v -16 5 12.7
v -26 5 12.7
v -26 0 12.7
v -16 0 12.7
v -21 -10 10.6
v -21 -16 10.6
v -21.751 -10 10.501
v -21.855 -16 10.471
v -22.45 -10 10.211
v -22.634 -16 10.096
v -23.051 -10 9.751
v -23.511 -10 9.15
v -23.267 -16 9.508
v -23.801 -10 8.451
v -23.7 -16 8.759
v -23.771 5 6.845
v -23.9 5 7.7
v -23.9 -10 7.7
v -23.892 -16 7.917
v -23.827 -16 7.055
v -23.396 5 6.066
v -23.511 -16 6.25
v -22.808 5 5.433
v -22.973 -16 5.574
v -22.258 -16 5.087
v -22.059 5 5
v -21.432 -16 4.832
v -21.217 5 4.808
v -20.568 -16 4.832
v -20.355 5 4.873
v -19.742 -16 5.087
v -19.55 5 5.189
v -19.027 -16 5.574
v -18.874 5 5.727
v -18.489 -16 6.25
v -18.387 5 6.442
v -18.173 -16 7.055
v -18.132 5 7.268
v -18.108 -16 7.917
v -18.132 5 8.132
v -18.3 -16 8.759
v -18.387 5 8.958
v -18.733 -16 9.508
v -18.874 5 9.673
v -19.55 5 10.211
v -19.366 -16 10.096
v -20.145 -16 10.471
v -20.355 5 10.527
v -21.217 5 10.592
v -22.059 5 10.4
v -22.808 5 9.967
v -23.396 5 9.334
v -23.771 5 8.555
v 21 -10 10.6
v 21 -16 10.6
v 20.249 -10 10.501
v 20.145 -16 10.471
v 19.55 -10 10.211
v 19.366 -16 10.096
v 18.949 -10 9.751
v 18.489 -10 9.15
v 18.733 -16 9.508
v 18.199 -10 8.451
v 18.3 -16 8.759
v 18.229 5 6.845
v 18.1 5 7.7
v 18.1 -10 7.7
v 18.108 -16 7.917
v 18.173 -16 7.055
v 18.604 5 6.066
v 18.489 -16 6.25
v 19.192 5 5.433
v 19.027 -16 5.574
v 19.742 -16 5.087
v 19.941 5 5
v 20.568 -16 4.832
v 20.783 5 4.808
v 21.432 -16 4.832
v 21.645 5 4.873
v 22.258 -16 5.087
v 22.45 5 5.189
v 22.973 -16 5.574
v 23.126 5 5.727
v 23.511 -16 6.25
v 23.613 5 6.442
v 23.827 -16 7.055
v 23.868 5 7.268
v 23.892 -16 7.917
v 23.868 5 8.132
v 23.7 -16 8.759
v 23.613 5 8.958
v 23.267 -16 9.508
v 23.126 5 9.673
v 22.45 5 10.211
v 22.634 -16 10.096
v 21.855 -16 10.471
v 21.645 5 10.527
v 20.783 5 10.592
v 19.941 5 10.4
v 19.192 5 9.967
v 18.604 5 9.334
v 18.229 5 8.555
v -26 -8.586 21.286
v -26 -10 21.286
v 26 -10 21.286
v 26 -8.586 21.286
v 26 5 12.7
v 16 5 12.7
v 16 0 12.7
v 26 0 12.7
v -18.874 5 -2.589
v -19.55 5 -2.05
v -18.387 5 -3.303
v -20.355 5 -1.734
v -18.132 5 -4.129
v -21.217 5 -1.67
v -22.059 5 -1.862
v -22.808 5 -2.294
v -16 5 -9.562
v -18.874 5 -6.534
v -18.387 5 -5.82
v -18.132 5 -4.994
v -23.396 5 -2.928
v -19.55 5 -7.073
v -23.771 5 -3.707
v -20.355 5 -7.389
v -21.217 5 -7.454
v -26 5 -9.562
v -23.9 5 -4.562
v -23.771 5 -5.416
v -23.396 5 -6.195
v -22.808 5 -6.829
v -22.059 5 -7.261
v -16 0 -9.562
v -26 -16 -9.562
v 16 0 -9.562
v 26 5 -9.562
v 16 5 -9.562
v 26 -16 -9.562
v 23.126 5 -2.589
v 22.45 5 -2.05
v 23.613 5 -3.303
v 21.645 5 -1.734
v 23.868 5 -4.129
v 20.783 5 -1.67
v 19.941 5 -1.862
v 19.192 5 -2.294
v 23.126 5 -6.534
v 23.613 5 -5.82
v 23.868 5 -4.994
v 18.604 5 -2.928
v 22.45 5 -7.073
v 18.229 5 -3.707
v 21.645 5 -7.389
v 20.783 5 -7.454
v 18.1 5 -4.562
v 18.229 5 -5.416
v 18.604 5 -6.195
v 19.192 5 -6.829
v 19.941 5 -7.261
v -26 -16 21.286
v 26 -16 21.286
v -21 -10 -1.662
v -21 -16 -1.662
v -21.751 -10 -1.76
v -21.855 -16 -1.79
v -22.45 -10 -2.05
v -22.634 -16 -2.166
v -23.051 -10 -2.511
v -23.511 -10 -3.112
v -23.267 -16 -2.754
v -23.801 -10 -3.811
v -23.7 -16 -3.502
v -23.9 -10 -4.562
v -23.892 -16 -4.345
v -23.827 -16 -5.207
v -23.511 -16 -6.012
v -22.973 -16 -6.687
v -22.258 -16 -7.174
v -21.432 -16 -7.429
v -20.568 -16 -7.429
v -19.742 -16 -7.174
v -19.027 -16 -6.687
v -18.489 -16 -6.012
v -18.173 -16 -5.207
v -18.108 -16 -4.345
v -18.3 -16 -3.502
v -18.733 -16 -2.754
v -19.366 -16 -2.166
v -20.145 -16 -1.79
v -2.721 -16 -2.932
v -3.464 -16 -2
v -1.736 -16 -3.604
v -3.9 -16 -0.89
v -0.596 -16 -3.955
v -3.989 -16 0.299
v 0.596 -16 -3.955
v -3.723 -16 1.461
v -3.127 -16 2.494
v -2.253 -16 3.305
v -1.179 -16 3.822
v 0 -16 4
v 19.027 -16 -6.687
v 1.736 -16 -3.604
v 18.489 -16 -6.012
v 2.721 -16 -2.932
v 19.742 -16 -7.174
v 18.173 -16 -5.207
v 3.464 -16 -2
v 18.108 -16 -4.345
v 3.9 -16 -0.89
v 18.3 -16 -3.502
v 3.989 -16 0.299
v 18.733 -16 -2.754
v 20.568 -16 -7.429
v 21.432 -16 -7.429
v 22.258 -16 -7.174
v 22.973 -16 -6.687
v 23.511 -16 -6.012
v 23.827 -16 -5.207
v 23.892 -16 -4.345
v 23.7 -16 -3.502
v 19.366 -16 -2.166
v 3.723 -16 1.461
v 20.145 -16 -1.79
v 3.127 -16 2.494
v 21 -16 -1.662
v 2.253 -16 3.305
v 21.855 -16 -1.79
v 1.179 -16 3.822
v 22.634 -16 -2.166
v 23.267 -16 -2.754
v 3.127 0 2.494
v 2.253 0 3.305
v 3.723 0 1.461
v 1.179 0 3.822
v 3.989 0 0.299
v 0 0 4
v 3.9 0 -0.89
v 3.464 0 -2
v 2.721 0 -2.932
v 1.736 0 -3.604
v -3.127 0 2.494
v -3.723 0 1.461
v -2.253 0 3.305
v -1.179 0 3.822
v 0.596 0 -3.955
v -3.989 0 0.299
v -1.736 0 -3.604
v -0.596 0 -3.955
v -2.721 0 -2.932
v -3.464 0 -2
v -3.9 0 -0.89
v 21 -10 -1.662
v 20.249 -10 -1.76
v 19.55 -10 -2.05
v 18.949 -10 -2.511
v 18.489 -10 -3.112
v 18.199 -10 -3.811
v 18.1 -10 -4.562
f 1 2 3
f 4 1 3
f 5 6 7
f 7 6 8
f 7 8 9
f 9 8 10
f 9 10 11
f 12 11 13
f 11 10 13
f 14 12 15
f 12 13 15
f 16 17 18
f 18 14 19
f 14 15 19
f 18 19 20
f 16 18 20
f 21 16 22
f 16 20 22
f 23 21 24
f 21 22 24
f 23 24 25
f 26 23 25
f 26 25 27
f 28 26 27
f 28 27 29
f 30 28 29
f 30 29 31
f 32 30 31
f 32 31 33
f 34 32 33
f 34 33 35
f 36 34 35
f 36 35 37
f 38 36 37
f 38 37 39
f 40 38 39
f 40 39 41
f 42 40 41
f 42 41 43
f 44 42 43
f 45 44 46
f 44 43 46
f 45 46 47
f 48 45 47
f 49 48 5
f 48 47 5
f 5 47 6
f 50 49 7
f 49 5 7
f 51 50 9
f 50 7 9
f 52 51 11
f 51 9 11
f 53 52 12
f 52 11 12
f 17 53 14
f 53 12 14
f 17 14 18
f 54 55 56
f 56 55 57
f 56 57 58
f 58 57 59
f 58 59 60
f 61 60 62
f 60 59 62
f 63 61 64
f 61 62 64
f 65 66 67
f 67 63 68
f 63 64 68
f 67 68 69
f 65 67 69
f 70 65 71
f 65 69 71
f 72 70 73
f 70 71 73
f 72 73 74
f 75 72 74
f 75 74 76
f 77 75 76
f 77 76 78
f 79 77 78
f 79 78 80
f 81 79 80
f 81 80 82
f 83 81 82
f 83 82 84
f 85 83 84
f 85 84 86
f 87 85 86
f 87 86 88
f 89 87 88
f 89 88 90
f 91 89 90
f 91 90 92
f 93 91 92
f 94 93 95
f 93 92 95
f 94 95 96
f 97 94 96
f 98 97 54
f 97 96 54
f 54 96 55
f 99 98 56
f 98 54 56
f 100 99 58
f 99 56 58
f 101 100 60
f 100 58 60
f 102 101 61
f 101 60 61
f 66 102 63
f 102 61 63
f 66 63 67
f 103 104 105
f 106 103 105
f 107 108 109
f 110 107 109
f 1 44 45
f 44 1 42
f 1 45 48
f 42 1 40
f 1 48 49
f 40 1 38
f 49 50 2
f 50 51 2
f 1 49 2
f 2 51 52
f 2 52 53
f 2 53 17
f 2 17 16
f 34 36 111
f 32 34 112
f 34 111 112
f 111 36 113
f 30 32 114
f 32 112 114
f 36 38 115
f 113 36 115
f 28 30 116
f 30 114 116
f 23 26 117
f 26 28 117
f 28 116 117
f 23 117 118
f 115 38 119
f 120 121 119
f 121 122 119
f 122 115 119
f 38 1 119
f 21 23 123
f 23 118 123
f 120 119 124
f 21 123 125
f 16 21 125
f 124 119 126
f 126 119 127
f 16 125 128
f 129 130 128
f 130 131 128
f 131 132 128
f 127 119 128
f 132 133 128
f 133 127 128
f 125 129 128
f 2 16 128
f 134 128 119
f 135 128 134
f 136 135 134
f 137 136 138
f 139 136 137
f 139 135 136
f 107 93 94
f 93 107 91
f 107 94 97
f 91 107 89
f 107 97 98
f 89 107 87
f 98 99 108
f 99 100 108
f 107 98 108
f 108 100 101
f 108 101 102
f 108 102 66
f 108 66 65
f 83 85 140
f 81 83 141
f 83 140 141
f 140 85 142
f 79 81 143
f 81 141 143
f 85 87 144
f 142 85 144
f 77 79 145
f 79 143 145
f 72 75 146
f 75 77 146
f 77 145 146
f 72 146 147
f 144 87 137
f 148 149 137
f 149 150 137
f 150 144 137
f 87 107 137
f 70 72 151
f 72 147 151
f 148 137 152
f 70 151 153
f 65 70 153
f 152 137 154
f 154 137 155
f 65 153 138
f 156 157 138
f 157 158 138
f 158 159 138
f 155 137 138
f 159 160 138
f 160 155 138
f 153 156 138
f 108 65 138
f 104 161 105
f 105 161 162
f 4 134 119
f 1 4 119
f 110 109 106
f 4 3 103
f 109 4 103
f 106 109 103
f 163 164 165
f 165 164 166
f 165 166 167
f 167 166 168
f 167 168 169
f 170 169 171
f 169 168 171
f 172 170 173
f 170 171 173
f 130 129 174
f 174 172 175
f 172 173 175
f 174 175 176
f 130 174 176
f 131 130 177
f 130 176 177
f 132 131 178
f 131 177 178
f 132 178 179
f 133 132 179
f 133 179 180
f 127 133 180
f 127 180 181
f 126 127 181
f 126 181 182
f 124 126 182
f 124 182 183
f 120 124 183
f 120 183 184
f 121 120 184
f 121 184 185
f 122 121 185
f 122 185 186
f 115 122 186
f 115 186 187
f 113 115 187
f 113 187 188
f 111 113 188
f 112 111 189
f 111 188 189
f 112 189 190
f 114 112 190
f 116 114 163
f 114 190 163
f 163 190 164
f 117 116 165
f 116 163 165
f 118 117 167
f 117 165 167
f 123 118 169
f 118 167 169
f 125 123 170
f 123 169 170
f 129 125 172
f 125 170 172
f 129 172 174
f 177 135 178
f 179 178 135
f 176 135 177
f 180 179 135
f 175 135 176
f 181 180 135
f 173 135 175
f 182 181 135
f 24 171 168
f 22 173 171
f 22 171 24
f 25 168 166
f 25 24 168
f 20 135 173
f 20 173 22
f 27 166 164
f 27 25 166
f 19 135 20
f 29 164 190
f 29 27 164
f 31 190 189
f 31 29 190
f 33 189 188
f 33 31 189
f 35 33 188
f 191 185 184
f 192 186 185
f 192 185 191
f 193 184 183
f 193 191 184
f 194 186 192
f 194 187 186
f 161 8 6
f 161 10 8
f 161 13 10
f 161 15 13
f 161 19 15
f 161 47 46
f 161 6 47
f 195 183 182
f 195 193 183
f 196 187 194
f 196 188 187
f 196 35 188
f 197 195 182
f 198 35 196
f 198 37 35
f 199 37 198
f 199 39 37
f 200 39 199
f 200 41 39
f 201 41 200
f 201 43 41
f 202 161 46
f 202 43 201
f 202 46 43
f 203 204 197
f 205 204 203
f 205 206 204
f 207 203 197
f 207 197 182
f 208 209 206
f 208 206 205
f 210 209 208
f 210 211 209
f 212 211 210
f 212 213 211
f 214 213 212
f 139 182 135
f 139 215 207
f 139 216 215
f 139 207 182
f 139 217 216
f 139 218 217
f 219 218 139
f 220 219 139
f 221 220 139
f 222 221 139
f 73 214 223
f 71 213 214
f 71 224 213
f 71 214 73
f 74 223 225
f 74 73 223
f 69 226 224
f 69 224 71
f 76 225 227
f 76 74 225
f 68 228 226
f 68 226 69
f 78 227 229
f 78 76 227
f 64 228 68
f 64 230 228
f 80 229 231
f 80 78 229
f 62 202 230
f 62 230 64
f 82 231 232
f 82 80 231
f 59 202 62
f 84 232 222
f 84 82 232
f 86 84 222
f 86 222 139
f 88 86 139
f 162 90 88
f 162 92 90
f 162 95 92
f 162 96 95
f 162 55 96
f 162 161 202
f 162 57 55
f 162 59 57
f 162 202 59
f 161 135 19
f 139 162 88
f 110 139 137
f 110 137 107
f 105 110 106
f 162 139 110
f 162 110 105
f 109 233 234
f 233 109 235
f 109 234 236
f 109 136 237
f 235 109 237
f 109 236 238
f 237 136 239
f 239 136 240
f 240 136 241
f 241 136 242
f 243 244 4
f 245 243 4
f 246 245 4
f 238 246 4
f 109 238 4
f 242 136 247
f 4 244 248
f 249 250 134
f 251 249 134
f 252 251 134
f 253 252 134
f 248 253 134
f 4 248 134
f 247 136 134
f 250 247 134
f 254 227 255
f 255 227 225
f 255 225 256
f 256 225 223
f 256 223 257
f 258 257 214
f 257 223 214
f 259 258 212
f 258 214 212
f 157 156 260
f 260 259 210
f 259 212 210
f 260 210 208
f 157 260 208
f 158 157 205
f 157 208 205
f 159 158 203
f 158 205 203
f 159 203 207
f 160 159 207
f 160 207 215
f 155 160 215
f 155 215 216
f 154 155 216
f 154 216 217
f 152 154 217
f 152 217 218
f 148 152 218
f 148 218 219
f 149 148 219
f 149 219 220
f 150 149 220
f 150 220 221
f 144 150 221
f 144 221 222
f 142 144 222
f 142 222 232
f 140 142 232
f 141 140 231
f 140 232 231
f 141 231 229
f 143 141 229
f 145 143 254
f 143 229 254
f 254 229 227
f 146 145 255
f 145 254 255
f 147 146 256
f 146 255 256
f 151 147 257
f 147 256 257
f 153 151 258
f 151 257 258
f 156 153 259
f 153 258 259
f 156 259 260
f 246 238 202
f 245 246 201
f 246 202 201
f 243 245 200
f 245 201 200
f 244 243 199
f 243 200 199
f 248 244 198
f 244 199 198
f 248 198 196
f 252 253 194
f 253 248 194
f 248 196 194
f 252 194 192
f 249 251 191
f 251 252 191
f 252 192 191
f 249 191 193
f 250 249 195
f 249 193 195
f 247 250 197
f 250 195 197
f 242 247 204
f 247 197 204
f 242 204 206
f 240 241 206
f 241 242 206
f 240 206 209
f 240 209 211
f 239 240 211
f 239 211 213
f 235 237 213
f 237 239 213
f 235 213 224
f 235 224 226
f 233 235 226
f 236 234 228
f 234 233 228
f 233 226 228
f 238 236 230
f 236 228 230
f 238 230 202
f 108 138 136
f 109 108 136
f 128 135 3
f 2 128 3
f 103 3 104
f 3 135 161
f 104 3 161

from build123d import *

# Parameters (mm, degrees)
SKETCH1_W            = 32
SKETCH1_H            = 23.261633661
SKETCH1_R            = 4
BOSS_EXTRUDE1_DEPTH  = 10
SKETCH3_W            = 10
SKETCH3_H            = 23.261633661
BOSS_EXTRUDE2_DEPTH  = 15
BOSS_EXTRUDE3_DEPTH  = 15
CUT_EXTRUDE1_DEPTH   = 61.230307985
M5_CLEARANCE_HOLE1_D = 5.8
CHAMFER1_SIZE        = 2
CHAMFER1_SIZE2       = 1.414213562
BOSS_EXTRUDE4_START  = 6
SKETCH9_W            = 52
SKETCH9_H            = 30.847420099
SKETCH9_R            = 2.9
SKETCH9_R_2          = 4
BOSS_EXTRUDE4_DEPTH  = 6


with BuildPart() as part:
    # Sketch1 → Boss-Extrude1 (new body)
    with BuildSketch(Plane(origin=(0, 0, 0), x_dir=(1, 0, 0), z_dir=(0, 1, 0))):
        with Locations((0, -2.06918317)):
            Rectangle(SKETCH1_W, SKETCH1_H)
        with Locations(Location((0, 0, 0), (0, 0, 270))):
            Circle(SKETCH1_R, mode=Mode.SUBTRACT)
    extrude(amount=-BOSS_EXTRUDE1_DEPTH)

    # Sketch3 → Boss-Extrude2 (add)
    with BuildSketch(Plane.XZ.offset(10)):
        with Locations((-21, 2.06918317)):
            Rectangle(SKETCH3_W, SKETCH3_H)
        with Locations((21, 2.06918317)):
            Rectangle(SKETCH3_W, SKETCH3_H)
    extrude(amount=-BOSS_EXTRUDE2_DEPTH)

    # Sketch5 → Boss-Extrude3 (add)
    with BuildSketch(Plane.XY.offset(13.7)):
        Polygon((16, 0), (-16, 0), (-16, 5), (-26, 5), (-26, -10), (26, -10), (26, 5), (16, 5), align=None)
    extrude(amount=BOSS_EXTRUDE3_DEPTH)

    # Sketch6 → Cut-Extrude1 (cut, through all)
    with BuildSketch(Plane.ZY.offset(26)):
        Polygon((12.7, 0), (22.7, -10), (28.7, -10), (28.7, 5), (12.7, 5), align=None)
    extrude(amount=-CUT_EXTRUDE1_DEPTH, mode=Mode.SUBTRACT)

    # M5 Clearance Hole1 (through all)
    with Locations(Plane(origin=(0, 5, 0), x_dir=(1, 0, 0), z_dir=(0, 1, 0))):
        with Locations((21, 4.561633661), (-21, 4.561633661), (-21, -7.7), (21, -7.7)):
            Hole(M5_CLEARANCE_HOLE1_D / 2)

    # Chamfer1
    chamfer1_edges = [part.edges().sort_by_distance(p)[0] for p in [
        (0, -10, 22.7),
    ]]
    chamfer1_side = [part.faces().sort_by_distance(p)[0] for p in [
        (0, -5, 17.7),
    ]]
    chamfer(chamfer1_edges, length=CHAMFER1_SIZE, length2=CHAMFER1_SIZE2, reference=chamfer1_side[0])

    # Sketch9 → Boss-Extrude4 (add)
    with BuildSketch(Plane.XZ.offset(10).offset(BOSS_EXTRUDE4_START)):
        with Locations((0, 5.862076389)):
            Rectangle(SKETCH9_W, SKETCH9_H)
        with Locations(Location((21, -4.561633661, 0), (0, 0, 90))):
            Circle(SKETCH9_R, mode=Mode.SUBTRACT)
        with Locations(Location((21, 7.7, 0), (0, 0, 90))):
            Circle(SKETCH9_R, mode=Mode.SUBTRACT)
        with Locations(Location((0, 0, 0), (0, 0, 90))):
            Circle(SKETCH9_R_2, mode=Mode.SUBTRACT)
        with Locations(Location((-21, -4.561633661, 0), (0, 0, 90))):
            Circle(SKETCH9_R, mode=Mode.SUBTRACT)
        with Locations(Location((-21, 7.7, 0), (0, 0, 90))):
            Circle(SKETCH9_R, mode=Mode.SUBTRACT)
    extrude(amount=-BOSS_EXTRUDE4_DEPTH)


solid = part.part
